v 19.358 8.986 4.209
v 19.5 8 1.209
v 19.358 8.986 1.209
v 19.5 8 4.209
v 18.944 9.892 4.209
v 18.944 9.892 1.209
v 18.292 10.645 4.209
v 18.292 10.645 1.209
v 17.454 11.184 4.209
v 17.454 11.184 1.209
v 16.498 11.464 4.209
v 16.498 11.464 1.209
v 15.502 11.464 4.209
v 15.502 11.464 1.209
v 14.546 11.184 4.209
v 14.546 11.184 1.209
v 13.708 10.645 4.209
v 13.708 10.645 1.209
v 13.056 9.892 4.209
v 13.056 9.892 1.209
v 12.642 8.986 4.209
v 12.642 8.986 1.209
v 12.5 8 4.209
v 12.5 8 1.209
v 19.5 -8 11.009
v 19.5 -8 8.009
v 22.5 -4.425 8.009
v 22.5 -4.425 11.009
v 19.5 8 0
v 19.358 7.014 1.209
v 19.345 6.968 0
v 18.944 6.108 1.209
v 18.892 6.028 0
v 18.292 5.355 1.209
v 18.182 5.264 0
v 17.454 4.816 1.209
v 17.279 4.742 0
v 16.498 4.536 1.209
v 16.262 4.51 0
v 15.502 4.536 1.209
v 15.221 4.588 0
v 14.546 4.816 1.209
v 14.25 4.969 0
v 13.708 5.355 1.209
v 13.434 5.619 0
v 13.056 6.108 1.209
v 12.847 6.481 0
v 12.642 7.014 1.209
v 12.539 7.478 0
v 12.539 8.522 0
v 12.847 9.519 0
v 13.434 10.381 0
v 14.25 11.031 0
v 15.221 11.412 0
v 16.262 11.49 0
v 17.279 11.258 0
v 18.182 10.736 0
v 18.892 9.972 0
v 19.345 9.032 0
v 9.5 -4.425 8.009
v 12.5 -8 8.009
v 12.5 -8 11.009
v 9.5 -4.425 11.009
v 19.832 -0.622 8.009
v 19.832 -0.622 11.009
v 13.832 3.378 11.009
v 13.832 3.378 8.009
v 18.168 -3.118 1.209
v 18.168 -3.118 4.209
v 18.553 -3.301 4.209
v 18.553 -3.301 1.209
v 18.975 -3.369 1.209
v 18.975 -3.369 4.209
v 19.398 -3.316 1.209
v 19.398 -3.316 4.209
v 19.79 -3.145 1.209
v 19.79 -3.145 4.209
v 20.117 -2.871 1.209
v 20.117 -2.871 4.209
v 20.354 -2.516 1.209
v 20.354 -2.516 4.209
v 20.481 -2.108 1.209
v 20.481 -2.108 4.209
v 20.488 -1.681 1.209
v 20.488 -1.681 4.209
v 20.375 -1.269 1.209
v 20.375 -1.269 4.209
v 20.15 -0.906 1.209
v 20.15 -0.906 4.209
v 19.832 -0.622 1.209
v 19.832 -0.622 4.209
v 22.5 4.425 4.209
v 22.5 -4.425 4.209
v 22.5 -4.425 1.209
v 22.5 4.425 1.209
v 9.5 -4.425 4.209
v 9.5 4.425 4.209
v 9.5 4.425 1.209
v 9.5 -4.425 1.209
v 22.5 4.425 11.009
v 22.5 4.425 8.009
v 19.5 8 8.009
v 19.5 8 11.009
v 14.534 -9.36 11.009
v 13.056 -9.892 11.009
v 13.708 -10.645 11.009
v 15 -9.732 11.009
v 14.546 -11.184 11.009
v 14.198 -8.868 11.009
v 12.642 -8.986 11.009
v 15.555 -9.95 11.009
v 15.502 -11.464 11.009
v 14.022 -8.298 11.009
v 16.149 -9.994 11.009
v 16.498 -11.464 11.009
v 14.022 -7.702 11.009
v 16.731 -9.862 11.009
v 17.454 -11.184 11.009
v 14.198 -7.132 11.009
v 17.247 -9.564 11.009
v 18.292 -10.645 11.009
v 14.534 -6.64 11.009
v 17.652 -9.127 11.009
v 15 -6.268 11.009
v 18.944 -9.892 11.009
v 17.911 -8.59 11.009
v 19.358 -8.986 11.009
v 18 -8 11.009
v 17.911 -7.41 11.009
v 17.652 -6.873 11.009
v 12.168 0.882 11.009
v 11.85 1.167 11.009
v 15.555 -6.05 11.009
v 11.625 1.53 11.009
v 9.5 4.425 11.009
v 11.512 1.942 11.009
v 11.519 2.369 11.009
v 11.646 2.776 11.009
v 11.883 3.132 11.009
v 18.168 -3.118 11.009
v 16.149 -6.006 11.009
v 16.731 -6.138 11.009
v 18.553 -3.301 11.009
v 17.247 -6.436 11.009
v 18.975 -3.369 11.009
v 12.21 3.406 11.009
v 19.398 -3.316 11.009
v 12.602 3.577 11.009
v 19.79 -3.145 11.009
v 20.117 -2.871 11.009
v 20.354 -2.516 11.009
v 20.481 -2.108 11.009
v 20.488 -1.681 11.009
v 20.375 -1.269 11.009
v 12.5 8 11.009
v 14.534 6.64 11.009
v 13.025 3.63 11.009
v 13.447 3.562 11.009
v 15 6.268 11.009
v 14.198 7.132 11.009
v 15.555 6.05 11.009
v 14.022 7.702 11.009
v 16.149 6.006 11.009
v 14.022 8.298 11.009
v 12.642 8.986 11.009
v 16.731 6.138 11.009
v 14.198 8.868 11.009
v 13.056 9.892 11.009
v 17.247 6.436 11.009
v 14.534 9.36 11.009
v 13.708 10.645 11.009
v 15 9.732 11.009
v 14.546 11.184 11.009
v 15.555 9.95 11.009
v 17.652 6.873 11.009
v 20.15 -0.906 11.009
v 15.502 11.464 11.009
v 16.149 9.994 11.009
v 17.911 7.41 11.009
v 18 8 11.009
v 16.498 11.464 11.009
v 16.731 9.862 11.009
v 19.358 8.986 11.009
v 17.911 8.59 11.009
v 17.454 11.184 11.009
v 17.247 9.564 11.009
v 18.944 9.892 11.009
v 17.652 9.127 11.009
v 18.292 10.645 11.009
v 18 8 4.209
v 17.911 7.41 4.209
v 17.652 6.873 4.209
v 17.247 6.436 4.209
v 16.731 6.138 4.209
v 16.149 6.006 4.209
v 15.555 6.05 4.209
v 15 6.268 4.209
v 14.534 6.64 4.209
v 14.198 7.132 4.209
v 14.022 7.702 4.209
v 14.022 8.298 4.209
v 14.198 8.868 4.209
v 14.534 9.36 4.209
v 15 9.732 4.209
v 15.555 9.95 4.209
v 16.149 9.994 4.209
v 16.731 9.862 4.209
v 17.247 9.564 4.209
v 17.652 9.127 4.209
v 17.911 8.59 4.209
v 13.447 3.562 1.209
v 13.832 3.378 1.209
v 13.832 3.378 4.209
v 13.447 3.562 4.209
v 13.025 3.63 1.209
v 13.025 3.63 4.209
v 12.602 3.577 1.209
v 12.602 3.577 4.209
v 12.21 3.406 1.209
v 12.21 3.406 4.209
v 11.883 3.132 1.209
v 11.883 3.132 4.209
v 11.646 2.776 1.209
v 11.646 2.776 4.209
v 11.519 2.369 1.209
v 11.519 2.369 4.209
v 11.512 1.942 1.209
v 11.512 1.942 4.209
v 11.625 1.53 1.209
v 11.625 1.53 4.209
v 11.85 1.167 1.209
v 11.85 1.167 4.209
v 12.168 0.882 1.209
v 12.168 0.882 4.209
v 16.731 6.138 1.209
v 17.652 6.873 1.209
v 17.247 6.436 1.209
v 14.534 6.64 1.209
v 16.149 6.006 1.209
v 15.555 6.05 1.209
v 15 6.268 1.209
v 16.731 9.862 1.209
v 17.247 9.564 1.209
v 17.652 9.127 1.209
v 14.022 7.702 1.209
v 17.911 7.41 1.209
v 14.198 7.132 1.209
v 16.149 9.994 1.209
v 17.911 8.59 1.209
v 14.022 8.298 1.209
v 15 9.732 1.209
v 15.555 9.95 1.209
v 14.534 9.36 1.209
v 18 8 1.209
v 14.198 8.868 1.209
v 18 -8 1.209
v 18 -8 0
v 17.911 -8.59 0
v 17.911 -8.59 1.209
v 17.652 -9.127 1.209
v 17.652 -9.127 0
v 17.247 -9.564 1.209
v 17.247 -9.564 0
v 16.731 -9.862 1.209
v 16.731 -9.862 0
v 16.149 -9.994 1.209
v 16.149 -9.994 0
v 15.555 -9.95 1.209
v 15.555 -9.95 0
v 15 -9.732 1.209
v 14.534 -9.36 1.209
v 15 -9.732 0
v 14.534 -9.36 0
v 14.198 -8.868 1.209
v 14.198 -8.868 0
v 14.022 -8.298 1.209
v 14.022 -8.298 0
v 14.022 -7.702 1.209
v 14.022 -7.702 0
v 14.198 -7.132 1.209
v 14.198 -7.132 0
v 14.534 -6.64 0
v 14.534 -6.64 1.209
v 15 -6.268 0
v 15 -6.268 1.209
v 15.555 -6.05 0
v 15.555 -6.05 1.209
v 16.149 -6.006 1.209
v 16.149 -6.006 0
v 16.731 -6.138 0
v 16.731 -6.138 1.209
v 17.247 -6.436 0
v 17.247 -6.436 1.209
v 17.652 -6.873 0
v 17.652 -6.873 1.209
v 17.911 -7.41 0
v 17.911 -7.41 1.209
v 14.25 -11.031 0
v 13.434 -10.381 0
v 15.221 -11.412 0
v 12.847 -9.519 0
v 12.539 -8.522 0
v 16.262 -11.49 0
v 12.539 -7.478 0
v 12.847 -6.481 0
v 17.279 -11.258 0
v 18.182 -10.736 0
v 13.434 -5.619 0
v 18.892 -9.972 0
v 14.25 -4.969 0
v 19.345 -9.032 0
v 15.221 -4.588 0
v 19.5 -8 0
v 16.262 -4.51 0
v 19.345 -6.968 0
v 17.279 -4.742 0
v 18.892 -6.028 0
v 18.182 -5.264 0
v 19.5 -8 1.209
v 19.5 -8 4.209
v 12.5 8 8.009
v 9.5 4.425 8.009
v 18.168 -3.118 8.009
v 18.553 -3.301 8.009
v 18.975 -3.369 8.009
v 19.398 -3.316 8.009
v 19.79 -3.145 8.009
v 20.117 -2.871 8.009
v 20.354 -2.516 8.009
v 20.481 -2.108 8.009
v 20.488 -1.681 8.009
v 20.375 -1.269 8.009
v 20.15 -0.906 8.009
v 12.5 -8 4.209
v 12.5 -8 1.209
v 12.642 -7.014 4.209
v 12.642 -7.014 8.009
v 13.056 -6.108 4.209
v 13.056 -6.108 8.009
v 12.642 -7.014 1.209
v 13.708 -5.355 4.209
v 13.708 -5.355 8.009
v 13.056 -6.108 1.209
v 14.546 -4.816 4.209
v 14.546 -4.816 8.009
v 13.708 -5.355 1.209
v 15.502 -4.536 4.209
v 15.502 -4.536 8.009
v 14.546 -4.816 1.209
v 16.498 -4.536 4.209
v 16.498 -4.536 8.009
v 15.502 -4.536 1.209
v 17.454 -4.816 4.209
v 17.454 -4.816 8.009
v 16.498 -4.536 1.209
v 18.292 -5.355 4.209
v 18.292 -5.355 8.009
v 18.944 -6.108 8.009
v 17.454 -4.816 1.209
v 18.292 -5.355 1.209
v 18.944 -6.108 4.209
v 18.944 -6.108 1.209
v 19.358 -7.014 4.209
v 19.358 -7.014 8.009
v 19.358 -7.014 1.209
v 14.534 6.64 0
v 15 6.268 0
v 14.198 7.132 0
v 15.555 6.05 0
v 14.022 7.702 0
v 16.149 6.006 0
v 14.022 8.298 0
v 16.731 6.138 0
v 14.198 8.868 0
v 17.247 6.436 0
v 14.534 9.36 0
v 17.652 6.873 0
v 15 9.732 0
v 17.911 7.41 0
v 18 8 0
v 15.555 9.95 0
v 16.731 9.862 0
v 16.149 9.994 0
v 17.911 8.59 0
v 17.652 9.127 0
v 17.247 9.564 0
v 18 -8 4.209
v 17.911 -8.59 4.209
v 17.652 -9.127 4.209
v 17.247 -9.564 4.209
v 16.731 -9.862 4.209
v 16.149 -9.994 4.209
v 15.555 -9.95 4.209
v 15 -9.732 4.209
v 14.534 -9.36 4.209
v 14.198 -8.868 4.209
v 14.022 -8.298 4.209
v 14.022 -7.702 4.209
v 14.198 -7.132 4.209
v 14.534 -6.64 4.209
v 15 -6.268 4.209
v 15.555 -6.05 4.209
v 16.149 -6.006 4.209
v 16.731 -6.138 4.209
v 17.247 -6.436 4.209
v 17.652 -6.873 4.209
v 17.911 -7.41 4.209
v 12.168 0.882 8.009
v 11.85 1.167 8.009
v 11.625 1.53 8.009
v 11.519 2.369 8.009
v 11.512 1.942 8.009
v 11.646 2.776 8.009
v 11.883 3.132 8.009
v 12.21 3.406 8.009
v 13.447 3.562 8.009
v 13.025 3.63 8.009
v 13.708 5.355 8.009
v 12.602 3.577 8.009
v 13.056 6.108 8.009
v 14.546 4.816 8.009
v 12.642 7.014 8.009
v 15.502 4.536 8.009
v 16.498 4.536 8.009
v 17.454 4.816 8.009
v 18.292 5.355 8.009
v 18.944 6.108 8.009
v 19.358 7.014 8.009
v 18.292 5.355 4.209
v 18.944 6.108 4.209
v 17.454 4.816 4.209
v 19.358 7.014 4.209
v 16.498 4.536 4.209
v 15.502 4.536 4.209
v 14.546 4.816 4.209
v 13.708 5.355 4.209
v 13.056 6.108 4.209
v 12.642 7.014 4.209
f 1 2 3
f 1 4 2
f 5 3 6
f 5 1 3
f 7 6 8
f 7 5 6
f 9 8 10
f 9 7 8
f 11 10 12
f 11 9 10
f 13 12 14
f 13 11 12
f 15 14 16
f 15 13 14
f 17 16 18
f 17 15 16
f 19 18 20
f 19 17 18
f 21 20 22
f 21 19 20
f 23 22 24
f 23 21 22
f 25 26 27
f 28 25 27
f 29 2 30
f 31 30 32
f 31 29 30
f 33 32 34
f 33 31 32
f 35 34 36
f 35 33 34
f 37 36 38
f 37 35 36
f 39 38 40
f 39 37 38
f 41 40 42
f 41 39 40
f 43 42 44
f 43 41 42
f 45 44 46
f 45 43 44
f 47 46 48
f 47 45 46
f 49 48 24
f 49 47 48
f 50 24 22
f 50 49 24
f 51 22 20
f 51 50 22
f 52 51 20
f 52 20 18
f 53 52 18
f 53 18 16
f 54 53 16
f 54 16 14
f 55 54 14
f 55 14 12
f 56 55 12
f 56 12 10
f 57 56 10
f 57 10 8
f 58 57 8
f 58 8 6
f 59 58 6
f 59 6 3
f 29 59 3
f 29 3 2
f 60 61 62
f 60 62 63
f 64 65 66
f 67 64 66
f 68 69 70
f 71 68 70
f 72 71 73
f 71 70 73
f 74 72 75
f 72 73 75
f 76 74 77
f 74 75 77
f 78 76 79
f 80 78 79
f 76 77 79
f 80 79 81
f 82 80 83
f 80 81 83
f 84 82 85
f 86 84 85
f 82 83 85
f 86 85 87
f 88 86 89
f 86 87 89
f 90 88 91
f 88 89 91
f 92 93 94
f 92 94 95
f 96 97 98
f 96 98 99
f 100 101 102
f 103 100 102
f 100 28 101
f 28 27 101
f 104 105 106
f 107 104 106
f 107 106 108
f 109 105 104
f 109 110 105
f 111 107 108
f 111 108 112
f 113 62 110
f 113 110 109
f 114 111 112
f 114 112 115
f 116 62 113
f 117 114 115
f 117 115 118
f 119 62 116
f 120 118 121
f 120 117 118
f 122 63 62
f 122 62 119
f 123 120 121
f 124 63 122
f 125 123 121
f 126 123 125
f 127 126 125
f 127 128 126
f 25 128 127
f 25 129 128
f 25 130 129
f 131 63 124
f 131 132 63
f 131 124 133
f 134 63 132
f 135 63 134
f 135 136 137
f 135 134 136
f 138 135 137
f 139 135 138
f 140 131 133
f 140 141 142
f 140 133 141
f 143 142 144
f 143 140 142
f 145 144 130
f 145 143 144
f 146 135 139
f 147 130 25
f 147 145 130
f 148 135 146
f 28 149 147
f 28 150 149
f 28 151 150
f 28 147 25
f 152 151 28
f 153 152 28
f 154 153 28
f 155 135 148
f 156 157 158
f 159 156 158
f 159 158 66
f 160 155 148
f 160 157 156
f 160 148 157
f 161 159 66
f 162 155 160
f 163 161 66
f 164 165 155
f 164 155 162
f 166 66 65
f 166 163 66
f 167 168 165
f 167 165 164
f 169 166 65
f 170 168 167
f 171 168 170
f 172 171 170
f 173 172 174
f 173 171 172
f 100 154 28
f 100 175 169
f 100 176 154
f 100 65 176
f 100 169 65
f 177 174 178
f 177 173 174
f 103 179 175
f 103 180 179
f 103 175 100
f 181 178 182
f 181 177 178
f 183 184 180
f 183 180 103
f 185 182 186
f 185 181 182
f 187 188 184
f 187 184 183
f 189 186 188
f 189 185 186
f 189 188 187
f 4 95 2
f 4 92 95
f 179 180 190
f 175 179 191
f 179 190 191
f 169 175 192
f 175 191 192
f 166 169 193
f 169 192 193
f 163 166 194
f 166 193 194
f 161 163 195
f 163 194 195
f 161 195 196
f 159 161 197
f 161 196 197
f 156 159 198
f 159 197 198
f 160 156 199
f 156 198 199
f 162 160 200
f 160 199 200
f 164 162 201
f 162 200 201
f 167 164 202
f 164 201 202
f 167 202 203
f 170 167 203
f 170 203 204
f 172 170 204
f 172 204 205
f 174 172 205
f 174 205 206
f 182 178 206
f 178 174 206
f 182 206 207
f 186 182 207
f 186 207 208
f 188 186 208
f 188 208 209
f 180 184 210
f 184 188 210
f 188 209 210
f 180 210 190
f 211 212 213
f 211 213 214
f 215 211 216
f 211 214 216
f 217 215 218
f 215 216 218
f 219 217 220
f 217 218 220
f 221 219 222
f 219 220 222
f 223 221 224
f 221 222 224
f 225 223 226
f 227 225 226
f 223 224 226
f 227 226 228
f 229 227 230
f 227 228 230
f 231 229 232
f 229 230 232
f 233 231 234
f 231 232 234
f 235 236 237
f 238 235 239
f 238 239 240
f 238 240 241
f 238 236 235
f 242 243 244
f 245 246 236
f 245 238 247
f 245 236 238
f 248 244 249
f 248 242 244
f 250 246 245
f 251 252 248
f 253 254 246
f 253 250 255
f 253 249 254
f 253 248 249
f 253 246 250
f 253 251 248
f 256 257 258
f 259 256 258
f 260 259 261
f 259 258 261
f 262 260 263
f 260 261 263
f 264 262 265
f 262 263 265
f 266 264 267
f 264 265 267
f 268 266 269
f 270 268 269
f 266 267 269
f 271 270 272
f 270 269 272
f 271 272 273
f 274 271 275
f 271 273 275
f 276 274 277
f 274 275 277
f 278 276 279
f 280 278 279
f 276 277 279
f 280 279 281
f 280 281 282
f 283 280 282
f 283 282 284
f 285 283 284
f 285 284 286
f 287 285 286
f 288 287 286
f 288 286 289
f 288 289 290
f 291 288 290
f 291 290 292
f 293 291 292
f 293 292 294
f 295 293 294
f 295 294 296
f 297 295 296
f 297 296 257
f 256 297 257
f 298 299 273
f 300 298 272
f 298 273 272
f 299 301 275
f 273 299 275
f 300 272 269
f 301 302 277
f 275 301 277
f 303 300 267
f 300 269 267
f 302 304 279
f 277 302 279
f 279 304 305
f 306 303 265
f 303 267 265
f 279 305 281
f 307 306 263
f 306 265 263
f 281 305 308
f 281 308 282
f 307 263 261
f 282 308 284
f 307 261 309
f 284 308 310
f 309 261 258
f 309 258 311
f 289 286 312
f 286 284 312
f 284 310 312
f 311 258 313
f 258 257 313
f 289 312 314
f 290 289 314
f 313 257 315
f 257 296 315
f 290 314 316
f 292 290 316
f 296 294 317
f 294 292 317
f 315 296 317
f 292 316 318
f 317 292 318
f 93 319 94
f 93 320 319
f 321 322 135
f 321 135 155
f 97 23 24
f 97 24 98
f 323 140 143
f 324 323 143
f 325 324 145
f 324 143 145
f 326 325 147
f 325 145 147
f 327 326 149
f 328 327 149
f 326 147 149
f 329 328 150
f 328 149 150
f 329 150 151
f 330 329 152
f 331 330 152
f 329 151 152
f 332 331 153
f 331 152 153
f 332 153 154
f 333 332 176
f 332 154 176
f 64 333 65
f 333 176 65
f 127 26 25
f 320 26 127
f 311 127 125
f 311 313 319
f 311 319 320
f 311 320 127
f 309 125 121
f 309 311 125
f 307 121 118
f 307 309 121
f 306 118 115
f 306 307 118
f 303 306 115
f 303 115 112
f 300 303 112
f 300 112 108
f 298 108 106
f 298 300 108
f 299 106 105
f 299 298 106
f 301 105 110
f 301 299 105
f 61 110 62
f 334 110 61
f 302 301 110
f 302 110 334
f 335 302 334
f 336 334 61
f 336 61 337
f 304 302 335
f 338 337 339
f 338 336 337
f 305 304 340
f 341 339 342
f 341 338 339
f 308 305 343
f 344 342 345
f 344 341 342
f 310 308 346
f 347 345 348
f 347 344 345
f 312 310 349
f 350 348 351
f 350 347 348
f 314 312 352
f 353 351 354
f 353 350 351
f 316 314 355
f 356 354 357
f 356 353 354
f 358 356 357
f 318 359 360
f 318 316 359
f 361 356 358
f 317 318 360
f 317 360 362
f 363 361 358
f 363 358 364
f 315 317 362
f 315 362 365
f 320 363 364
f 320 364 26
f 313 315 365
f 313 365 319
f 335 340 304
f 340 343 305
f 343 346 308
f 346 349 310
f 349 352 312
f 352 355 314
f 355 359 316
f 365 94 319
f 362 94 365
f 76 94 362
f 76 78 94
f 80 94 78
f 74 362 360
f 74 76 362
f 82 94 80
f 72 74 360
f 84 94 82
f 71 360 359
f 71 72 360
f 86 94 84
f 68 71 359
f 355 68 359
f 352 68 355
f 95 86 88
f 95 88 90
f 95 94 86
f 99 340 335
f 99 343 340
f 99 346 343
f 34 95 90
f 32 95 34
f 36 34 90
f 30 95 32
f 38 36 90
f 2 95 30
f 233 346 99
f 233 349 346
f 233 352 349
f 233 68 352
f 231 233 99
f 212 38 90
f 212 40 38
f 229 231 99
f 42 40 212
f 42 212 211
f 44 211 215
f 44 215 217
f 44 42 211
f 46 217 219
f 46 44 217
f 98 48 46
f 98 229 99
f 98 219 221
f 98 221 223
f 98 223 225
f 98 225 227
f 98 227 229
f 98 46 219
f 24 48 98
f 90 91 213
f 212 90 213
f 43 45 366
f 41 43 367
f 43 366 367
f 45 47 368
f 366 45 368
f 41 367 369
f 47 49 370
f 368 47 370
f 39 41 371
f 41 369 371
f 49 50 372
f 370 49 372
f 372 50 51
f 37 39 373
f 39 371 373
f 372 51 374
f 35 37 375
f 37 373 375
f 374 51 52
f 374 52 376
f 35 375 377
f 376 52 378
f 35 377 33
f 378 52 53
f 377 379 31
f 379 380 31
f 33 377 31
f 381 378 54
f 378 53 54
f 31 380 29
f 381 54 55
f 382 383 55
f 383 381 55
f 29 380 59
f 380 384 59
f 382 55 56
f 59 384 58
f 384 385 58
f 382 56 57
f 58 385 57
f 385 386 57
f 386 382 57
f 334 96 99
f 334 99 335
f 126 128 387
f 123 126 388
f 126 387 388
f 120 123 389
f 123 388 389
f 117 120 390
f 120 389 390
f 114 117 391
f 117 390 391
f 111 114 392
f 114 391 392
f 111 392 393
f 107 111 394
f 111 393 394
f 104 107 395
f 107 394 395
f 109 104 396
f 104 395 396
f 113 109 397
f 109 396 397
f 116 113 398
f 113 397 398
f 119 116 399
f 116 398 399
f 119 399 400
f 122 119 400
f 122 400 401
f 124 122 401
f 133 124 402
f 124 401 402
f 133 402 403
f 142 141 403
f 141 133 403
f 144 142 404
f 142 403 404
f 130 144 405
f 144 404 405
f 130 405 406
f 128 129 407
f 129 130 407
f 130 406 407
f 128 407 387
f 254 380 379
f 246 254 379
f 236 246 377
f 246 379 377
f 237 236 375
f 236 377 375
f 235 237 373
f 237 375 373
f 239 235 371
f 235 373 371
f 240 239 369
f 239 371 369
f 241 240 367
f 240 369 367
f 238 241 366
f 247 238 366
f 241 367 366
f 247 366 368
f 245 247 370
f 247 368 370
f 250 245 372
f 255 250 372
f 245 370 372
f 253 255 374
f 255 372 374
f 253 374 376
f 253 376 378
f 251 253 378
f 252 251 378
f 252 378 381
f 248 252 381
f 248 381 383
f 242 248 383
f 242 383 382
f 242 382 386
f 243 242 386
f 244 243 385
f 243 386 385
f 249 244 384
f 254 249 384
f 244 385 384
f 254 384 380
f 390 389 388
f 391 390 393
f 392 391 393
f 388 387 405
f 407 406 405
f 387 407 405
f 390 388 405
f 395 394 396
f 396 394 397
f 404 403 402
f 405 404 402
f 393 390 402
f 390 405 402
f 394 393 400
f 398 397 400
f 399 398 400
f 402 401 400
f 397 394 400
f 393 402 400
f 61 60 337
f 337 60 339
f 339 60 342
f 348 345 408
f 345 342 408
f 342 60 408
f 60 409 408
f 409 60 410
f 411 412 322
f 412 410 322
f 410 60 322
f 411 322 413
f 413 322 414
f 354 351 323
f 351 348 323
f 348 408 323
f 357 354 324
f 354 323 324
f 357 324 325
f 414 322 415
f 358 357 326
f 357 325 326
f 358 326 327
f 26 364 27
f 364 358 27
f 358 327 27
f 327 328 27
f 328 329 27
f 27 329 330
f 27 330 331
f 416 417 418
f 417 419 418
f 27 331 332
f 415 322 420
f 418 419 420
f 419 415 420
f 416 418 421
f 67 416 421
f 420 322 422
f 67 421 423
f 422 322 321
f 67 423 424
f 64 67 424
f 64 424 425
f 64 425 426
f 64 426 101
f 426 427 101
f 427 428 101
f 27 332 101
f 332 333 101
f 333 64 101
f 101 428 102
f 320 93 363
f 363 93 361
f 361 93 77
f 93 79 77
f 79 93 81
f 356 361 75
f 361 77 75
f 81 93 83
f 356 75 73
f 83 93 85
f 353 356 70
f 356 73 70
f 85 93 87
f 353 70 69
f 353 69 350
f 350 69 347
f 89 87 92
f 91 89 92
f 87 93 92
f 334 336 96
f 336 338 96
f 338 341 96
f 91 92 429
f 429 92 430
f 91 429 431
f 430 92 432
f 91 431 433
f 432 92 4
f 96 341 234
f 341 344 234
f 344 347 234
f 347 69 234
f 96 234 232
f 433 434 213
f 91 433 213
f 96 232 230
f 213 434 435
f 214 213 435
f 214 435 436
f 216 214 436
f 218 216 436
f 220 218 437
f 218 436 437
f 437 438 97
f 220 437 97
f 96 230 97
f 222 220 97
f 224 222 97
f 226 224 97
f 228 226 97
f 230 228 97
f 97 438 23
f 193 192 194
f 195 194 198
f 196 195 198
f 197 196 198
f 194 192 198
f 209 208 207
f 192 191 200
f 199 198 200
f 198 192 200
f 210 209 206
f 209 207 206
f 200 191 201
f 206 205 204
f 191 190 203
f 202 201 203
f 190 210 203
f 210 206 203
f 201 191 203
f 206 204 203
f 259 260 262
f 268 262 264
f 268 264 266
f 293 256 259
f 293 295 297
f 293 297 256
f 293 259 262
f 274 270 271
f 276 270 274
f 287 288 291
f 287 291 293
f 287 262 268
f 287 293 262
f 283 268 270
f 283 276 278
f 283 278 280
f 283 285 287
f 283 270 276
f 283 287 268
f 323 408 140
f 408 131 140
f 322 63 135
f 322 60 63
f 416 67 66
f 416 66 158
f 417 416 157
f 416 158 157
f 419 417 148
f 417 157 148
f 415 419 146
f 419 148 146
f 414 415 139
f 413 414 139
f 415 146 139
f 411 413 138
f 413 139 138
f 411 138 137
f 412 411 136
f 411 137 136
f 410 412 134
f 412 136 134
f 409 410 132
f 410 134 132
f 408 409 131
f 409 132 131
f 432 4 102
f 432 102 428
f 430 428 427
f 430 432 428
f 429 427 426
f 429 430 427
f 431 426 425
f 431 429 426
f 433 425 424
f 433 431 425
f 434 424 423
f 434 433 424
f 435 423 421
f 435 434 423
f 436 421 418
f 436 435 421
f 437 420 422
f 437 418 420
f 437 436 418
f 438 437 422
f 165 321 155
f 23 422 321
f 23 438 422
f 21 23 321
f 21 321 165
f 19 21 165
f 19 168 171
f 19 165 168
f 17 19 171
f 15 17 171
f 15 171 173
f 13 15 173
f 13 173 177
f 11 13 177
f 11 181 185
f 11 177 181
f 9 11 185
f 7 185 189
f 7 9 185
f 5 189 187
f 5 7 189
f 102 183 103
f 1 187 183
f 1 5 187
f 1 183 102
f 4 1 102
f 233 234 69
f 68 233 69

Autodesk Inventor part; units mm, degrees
ref_plane "YZ Plane" through (0, 0, 0) normal (1, 0, 0) x (0, 1, 0)
sketch "Base" plane through (0, 0, 0) normal (0, 0, 1) x (1, 0, 0)
  circle A0 centre (16, -8) radius 2
  circle A1 centre (16, 8) radius 2
  circle A2 centre (16, -8) radius 3.5
  circle A3 centre (16, 8) radius 3.5
  point P0 (0, 0)
  dimension "d40" = 7
ref_plane "TopPlane" through (16.8435, -4.86, 8.0094) normal (0, 0, 1) x (1, 0, 0)
ref_plane "TopReferencePlane" through (16.8435, -4.86, 6.0094) normal (0, 0, 1) x (1, 0, 0)
extrude "BaseFeature" add sketch "Base" along normal up to surface (8.0094 mm away)
sketch "Cap" plane through (16, -8, 8.0094) normal (0, 0, 1) x (1, 0, 0)
  circle A0 centre (0, 0) radius 3.5 construction
  line L0 (3.5, 0) -> (6.5, 3.5753)
  line L1 (6.5, 3.5753) -> (6.5, 12.4247)
  line L2 (6.5, 12.4247) -> (3.5, 16)
  circle A1 centre (0, 16) radius 3.5 construction
  line L3 (-3.5, 0) -> (-3.5, 16) construction
  line L4 (-3.5, 8) -> (6.5, 8) construction
  circle A2 centre (0, 16) radius 3.5 projected
  arc A3 (-3.5, 0) -> (3.5, 0) centre (0, 0) ccw
  arc A4 (3.5, 16) -> (-3.5, 16) centre (0, 16) ccw
  circle A5 centre (0, 0) radius 2
  circle A6 centre (0, 16) radius 2
  line L5 (0, 0) -> (0, 16) construction
  line L6 (-3.5, 0) -> (-6.5, 3.5753)
  line L7 (-6.5, 3.5753) -> (-6.5, 12.4247)
  line L8 (-6.5, 12.4247) -> (-3.5, 16)
  point P0 (-16, 8)
  point P1 (-3.5, 16)
  point P2 (-3.5, 0)
  dimension "d43" = 140
  dimension "d44" = 140
  dimension "d45" = 10
extrude "CapFeature" add sketch "Cap" along normal blind 3
ref_plane "BottomPlane" through (16.7486, 4.86, 4.2094) normal (0, 0, -1) x (-1, 0, 0)
ref_plane "BottomReferencePlane" through (16.7486, 4.86, 5.2094) normal (0, 0, -1) x (-1, 0, 0)
sketch "Bottom" plane through (16.7486, 4.86, 4.2094) normal (0, 0, -1) x (-1, 0, 0)
  arc A0 (4.2486, 3.14) -> (-2.7514, 3.14) centre (0.7486, 3.14) ccw projected
  line L0 (4.2486, 3.14) -> (7.2486, -0.4353) projected
  line L1 (7.2486, -0.4353) -> (7.2486, -9.2847) projected
  line L2 (7.2486, -9.2847) -> (4.2486, -12.86) projected
  arc A1 (-2.7514, -12.86) -> (4.2486, -12.86) centre (0.7486, -12.86) ccw projected
  line L3 (-2.7514, -12.86) -> (-5.7514, -9.2847) projected
  line L4 (-5.7514, -9.2847) -> (-5.7514, -0.4353) projected
  line L5 (-5.7514, -0.4353) -> (-2.7514, 3.14) projected
  circle A2 centre (0.7486, 3.14) radius 2 projected
  circle A3 centre (0.7486, -12.86) radius 2 projected
  point P0 (16.7486, -4.86)
extrude "BottomFeature" add sketch "Bottom" along normal blind 3 contours L0 L1 L2 A1 L3 L4 L5 A0 | A2 | A3
sketch "Sketch11" plane through (16, -8, 11.0094) normal (0, 0, 1) x (1, 0, 0)
  line L0 (-3, 10.1304) -> (3, 6.1304) construction
  line L1 (-3.8321, 8.8824) -> (2.1679, 4.8824)
  line L2 (3.8321, 7.3785) -> (-2.1679, 11.3785)
  arc A0 (-2.1679, 11.3785) -> (-3.8321, 8.8824) centre (-3, 10.1304) ccw
  arc A1 (2.1679, 4.8824) -> (3.8321, 7.3785) centre (3, 6.1304) ccw
  line L3 (-6.5, 12.4247) -> (-6.5, 3.5753) projected
  line L4 (6.5, 3.5753) -> (6.5, 12.4247) projected
  point P0 (-16, 8)
  point P1 (0, 8.1304)
  dimension "d52" = 3.5
  dimension "d53" = 3.5
  dimension "d54" = 1.5
extrude "Extrusion10" cut sketch "Sketch11" against normal through all
equation "\"d44\" = d43"
equation "\"d53\" = d52"
properties part number "PotentiometerBracket"
